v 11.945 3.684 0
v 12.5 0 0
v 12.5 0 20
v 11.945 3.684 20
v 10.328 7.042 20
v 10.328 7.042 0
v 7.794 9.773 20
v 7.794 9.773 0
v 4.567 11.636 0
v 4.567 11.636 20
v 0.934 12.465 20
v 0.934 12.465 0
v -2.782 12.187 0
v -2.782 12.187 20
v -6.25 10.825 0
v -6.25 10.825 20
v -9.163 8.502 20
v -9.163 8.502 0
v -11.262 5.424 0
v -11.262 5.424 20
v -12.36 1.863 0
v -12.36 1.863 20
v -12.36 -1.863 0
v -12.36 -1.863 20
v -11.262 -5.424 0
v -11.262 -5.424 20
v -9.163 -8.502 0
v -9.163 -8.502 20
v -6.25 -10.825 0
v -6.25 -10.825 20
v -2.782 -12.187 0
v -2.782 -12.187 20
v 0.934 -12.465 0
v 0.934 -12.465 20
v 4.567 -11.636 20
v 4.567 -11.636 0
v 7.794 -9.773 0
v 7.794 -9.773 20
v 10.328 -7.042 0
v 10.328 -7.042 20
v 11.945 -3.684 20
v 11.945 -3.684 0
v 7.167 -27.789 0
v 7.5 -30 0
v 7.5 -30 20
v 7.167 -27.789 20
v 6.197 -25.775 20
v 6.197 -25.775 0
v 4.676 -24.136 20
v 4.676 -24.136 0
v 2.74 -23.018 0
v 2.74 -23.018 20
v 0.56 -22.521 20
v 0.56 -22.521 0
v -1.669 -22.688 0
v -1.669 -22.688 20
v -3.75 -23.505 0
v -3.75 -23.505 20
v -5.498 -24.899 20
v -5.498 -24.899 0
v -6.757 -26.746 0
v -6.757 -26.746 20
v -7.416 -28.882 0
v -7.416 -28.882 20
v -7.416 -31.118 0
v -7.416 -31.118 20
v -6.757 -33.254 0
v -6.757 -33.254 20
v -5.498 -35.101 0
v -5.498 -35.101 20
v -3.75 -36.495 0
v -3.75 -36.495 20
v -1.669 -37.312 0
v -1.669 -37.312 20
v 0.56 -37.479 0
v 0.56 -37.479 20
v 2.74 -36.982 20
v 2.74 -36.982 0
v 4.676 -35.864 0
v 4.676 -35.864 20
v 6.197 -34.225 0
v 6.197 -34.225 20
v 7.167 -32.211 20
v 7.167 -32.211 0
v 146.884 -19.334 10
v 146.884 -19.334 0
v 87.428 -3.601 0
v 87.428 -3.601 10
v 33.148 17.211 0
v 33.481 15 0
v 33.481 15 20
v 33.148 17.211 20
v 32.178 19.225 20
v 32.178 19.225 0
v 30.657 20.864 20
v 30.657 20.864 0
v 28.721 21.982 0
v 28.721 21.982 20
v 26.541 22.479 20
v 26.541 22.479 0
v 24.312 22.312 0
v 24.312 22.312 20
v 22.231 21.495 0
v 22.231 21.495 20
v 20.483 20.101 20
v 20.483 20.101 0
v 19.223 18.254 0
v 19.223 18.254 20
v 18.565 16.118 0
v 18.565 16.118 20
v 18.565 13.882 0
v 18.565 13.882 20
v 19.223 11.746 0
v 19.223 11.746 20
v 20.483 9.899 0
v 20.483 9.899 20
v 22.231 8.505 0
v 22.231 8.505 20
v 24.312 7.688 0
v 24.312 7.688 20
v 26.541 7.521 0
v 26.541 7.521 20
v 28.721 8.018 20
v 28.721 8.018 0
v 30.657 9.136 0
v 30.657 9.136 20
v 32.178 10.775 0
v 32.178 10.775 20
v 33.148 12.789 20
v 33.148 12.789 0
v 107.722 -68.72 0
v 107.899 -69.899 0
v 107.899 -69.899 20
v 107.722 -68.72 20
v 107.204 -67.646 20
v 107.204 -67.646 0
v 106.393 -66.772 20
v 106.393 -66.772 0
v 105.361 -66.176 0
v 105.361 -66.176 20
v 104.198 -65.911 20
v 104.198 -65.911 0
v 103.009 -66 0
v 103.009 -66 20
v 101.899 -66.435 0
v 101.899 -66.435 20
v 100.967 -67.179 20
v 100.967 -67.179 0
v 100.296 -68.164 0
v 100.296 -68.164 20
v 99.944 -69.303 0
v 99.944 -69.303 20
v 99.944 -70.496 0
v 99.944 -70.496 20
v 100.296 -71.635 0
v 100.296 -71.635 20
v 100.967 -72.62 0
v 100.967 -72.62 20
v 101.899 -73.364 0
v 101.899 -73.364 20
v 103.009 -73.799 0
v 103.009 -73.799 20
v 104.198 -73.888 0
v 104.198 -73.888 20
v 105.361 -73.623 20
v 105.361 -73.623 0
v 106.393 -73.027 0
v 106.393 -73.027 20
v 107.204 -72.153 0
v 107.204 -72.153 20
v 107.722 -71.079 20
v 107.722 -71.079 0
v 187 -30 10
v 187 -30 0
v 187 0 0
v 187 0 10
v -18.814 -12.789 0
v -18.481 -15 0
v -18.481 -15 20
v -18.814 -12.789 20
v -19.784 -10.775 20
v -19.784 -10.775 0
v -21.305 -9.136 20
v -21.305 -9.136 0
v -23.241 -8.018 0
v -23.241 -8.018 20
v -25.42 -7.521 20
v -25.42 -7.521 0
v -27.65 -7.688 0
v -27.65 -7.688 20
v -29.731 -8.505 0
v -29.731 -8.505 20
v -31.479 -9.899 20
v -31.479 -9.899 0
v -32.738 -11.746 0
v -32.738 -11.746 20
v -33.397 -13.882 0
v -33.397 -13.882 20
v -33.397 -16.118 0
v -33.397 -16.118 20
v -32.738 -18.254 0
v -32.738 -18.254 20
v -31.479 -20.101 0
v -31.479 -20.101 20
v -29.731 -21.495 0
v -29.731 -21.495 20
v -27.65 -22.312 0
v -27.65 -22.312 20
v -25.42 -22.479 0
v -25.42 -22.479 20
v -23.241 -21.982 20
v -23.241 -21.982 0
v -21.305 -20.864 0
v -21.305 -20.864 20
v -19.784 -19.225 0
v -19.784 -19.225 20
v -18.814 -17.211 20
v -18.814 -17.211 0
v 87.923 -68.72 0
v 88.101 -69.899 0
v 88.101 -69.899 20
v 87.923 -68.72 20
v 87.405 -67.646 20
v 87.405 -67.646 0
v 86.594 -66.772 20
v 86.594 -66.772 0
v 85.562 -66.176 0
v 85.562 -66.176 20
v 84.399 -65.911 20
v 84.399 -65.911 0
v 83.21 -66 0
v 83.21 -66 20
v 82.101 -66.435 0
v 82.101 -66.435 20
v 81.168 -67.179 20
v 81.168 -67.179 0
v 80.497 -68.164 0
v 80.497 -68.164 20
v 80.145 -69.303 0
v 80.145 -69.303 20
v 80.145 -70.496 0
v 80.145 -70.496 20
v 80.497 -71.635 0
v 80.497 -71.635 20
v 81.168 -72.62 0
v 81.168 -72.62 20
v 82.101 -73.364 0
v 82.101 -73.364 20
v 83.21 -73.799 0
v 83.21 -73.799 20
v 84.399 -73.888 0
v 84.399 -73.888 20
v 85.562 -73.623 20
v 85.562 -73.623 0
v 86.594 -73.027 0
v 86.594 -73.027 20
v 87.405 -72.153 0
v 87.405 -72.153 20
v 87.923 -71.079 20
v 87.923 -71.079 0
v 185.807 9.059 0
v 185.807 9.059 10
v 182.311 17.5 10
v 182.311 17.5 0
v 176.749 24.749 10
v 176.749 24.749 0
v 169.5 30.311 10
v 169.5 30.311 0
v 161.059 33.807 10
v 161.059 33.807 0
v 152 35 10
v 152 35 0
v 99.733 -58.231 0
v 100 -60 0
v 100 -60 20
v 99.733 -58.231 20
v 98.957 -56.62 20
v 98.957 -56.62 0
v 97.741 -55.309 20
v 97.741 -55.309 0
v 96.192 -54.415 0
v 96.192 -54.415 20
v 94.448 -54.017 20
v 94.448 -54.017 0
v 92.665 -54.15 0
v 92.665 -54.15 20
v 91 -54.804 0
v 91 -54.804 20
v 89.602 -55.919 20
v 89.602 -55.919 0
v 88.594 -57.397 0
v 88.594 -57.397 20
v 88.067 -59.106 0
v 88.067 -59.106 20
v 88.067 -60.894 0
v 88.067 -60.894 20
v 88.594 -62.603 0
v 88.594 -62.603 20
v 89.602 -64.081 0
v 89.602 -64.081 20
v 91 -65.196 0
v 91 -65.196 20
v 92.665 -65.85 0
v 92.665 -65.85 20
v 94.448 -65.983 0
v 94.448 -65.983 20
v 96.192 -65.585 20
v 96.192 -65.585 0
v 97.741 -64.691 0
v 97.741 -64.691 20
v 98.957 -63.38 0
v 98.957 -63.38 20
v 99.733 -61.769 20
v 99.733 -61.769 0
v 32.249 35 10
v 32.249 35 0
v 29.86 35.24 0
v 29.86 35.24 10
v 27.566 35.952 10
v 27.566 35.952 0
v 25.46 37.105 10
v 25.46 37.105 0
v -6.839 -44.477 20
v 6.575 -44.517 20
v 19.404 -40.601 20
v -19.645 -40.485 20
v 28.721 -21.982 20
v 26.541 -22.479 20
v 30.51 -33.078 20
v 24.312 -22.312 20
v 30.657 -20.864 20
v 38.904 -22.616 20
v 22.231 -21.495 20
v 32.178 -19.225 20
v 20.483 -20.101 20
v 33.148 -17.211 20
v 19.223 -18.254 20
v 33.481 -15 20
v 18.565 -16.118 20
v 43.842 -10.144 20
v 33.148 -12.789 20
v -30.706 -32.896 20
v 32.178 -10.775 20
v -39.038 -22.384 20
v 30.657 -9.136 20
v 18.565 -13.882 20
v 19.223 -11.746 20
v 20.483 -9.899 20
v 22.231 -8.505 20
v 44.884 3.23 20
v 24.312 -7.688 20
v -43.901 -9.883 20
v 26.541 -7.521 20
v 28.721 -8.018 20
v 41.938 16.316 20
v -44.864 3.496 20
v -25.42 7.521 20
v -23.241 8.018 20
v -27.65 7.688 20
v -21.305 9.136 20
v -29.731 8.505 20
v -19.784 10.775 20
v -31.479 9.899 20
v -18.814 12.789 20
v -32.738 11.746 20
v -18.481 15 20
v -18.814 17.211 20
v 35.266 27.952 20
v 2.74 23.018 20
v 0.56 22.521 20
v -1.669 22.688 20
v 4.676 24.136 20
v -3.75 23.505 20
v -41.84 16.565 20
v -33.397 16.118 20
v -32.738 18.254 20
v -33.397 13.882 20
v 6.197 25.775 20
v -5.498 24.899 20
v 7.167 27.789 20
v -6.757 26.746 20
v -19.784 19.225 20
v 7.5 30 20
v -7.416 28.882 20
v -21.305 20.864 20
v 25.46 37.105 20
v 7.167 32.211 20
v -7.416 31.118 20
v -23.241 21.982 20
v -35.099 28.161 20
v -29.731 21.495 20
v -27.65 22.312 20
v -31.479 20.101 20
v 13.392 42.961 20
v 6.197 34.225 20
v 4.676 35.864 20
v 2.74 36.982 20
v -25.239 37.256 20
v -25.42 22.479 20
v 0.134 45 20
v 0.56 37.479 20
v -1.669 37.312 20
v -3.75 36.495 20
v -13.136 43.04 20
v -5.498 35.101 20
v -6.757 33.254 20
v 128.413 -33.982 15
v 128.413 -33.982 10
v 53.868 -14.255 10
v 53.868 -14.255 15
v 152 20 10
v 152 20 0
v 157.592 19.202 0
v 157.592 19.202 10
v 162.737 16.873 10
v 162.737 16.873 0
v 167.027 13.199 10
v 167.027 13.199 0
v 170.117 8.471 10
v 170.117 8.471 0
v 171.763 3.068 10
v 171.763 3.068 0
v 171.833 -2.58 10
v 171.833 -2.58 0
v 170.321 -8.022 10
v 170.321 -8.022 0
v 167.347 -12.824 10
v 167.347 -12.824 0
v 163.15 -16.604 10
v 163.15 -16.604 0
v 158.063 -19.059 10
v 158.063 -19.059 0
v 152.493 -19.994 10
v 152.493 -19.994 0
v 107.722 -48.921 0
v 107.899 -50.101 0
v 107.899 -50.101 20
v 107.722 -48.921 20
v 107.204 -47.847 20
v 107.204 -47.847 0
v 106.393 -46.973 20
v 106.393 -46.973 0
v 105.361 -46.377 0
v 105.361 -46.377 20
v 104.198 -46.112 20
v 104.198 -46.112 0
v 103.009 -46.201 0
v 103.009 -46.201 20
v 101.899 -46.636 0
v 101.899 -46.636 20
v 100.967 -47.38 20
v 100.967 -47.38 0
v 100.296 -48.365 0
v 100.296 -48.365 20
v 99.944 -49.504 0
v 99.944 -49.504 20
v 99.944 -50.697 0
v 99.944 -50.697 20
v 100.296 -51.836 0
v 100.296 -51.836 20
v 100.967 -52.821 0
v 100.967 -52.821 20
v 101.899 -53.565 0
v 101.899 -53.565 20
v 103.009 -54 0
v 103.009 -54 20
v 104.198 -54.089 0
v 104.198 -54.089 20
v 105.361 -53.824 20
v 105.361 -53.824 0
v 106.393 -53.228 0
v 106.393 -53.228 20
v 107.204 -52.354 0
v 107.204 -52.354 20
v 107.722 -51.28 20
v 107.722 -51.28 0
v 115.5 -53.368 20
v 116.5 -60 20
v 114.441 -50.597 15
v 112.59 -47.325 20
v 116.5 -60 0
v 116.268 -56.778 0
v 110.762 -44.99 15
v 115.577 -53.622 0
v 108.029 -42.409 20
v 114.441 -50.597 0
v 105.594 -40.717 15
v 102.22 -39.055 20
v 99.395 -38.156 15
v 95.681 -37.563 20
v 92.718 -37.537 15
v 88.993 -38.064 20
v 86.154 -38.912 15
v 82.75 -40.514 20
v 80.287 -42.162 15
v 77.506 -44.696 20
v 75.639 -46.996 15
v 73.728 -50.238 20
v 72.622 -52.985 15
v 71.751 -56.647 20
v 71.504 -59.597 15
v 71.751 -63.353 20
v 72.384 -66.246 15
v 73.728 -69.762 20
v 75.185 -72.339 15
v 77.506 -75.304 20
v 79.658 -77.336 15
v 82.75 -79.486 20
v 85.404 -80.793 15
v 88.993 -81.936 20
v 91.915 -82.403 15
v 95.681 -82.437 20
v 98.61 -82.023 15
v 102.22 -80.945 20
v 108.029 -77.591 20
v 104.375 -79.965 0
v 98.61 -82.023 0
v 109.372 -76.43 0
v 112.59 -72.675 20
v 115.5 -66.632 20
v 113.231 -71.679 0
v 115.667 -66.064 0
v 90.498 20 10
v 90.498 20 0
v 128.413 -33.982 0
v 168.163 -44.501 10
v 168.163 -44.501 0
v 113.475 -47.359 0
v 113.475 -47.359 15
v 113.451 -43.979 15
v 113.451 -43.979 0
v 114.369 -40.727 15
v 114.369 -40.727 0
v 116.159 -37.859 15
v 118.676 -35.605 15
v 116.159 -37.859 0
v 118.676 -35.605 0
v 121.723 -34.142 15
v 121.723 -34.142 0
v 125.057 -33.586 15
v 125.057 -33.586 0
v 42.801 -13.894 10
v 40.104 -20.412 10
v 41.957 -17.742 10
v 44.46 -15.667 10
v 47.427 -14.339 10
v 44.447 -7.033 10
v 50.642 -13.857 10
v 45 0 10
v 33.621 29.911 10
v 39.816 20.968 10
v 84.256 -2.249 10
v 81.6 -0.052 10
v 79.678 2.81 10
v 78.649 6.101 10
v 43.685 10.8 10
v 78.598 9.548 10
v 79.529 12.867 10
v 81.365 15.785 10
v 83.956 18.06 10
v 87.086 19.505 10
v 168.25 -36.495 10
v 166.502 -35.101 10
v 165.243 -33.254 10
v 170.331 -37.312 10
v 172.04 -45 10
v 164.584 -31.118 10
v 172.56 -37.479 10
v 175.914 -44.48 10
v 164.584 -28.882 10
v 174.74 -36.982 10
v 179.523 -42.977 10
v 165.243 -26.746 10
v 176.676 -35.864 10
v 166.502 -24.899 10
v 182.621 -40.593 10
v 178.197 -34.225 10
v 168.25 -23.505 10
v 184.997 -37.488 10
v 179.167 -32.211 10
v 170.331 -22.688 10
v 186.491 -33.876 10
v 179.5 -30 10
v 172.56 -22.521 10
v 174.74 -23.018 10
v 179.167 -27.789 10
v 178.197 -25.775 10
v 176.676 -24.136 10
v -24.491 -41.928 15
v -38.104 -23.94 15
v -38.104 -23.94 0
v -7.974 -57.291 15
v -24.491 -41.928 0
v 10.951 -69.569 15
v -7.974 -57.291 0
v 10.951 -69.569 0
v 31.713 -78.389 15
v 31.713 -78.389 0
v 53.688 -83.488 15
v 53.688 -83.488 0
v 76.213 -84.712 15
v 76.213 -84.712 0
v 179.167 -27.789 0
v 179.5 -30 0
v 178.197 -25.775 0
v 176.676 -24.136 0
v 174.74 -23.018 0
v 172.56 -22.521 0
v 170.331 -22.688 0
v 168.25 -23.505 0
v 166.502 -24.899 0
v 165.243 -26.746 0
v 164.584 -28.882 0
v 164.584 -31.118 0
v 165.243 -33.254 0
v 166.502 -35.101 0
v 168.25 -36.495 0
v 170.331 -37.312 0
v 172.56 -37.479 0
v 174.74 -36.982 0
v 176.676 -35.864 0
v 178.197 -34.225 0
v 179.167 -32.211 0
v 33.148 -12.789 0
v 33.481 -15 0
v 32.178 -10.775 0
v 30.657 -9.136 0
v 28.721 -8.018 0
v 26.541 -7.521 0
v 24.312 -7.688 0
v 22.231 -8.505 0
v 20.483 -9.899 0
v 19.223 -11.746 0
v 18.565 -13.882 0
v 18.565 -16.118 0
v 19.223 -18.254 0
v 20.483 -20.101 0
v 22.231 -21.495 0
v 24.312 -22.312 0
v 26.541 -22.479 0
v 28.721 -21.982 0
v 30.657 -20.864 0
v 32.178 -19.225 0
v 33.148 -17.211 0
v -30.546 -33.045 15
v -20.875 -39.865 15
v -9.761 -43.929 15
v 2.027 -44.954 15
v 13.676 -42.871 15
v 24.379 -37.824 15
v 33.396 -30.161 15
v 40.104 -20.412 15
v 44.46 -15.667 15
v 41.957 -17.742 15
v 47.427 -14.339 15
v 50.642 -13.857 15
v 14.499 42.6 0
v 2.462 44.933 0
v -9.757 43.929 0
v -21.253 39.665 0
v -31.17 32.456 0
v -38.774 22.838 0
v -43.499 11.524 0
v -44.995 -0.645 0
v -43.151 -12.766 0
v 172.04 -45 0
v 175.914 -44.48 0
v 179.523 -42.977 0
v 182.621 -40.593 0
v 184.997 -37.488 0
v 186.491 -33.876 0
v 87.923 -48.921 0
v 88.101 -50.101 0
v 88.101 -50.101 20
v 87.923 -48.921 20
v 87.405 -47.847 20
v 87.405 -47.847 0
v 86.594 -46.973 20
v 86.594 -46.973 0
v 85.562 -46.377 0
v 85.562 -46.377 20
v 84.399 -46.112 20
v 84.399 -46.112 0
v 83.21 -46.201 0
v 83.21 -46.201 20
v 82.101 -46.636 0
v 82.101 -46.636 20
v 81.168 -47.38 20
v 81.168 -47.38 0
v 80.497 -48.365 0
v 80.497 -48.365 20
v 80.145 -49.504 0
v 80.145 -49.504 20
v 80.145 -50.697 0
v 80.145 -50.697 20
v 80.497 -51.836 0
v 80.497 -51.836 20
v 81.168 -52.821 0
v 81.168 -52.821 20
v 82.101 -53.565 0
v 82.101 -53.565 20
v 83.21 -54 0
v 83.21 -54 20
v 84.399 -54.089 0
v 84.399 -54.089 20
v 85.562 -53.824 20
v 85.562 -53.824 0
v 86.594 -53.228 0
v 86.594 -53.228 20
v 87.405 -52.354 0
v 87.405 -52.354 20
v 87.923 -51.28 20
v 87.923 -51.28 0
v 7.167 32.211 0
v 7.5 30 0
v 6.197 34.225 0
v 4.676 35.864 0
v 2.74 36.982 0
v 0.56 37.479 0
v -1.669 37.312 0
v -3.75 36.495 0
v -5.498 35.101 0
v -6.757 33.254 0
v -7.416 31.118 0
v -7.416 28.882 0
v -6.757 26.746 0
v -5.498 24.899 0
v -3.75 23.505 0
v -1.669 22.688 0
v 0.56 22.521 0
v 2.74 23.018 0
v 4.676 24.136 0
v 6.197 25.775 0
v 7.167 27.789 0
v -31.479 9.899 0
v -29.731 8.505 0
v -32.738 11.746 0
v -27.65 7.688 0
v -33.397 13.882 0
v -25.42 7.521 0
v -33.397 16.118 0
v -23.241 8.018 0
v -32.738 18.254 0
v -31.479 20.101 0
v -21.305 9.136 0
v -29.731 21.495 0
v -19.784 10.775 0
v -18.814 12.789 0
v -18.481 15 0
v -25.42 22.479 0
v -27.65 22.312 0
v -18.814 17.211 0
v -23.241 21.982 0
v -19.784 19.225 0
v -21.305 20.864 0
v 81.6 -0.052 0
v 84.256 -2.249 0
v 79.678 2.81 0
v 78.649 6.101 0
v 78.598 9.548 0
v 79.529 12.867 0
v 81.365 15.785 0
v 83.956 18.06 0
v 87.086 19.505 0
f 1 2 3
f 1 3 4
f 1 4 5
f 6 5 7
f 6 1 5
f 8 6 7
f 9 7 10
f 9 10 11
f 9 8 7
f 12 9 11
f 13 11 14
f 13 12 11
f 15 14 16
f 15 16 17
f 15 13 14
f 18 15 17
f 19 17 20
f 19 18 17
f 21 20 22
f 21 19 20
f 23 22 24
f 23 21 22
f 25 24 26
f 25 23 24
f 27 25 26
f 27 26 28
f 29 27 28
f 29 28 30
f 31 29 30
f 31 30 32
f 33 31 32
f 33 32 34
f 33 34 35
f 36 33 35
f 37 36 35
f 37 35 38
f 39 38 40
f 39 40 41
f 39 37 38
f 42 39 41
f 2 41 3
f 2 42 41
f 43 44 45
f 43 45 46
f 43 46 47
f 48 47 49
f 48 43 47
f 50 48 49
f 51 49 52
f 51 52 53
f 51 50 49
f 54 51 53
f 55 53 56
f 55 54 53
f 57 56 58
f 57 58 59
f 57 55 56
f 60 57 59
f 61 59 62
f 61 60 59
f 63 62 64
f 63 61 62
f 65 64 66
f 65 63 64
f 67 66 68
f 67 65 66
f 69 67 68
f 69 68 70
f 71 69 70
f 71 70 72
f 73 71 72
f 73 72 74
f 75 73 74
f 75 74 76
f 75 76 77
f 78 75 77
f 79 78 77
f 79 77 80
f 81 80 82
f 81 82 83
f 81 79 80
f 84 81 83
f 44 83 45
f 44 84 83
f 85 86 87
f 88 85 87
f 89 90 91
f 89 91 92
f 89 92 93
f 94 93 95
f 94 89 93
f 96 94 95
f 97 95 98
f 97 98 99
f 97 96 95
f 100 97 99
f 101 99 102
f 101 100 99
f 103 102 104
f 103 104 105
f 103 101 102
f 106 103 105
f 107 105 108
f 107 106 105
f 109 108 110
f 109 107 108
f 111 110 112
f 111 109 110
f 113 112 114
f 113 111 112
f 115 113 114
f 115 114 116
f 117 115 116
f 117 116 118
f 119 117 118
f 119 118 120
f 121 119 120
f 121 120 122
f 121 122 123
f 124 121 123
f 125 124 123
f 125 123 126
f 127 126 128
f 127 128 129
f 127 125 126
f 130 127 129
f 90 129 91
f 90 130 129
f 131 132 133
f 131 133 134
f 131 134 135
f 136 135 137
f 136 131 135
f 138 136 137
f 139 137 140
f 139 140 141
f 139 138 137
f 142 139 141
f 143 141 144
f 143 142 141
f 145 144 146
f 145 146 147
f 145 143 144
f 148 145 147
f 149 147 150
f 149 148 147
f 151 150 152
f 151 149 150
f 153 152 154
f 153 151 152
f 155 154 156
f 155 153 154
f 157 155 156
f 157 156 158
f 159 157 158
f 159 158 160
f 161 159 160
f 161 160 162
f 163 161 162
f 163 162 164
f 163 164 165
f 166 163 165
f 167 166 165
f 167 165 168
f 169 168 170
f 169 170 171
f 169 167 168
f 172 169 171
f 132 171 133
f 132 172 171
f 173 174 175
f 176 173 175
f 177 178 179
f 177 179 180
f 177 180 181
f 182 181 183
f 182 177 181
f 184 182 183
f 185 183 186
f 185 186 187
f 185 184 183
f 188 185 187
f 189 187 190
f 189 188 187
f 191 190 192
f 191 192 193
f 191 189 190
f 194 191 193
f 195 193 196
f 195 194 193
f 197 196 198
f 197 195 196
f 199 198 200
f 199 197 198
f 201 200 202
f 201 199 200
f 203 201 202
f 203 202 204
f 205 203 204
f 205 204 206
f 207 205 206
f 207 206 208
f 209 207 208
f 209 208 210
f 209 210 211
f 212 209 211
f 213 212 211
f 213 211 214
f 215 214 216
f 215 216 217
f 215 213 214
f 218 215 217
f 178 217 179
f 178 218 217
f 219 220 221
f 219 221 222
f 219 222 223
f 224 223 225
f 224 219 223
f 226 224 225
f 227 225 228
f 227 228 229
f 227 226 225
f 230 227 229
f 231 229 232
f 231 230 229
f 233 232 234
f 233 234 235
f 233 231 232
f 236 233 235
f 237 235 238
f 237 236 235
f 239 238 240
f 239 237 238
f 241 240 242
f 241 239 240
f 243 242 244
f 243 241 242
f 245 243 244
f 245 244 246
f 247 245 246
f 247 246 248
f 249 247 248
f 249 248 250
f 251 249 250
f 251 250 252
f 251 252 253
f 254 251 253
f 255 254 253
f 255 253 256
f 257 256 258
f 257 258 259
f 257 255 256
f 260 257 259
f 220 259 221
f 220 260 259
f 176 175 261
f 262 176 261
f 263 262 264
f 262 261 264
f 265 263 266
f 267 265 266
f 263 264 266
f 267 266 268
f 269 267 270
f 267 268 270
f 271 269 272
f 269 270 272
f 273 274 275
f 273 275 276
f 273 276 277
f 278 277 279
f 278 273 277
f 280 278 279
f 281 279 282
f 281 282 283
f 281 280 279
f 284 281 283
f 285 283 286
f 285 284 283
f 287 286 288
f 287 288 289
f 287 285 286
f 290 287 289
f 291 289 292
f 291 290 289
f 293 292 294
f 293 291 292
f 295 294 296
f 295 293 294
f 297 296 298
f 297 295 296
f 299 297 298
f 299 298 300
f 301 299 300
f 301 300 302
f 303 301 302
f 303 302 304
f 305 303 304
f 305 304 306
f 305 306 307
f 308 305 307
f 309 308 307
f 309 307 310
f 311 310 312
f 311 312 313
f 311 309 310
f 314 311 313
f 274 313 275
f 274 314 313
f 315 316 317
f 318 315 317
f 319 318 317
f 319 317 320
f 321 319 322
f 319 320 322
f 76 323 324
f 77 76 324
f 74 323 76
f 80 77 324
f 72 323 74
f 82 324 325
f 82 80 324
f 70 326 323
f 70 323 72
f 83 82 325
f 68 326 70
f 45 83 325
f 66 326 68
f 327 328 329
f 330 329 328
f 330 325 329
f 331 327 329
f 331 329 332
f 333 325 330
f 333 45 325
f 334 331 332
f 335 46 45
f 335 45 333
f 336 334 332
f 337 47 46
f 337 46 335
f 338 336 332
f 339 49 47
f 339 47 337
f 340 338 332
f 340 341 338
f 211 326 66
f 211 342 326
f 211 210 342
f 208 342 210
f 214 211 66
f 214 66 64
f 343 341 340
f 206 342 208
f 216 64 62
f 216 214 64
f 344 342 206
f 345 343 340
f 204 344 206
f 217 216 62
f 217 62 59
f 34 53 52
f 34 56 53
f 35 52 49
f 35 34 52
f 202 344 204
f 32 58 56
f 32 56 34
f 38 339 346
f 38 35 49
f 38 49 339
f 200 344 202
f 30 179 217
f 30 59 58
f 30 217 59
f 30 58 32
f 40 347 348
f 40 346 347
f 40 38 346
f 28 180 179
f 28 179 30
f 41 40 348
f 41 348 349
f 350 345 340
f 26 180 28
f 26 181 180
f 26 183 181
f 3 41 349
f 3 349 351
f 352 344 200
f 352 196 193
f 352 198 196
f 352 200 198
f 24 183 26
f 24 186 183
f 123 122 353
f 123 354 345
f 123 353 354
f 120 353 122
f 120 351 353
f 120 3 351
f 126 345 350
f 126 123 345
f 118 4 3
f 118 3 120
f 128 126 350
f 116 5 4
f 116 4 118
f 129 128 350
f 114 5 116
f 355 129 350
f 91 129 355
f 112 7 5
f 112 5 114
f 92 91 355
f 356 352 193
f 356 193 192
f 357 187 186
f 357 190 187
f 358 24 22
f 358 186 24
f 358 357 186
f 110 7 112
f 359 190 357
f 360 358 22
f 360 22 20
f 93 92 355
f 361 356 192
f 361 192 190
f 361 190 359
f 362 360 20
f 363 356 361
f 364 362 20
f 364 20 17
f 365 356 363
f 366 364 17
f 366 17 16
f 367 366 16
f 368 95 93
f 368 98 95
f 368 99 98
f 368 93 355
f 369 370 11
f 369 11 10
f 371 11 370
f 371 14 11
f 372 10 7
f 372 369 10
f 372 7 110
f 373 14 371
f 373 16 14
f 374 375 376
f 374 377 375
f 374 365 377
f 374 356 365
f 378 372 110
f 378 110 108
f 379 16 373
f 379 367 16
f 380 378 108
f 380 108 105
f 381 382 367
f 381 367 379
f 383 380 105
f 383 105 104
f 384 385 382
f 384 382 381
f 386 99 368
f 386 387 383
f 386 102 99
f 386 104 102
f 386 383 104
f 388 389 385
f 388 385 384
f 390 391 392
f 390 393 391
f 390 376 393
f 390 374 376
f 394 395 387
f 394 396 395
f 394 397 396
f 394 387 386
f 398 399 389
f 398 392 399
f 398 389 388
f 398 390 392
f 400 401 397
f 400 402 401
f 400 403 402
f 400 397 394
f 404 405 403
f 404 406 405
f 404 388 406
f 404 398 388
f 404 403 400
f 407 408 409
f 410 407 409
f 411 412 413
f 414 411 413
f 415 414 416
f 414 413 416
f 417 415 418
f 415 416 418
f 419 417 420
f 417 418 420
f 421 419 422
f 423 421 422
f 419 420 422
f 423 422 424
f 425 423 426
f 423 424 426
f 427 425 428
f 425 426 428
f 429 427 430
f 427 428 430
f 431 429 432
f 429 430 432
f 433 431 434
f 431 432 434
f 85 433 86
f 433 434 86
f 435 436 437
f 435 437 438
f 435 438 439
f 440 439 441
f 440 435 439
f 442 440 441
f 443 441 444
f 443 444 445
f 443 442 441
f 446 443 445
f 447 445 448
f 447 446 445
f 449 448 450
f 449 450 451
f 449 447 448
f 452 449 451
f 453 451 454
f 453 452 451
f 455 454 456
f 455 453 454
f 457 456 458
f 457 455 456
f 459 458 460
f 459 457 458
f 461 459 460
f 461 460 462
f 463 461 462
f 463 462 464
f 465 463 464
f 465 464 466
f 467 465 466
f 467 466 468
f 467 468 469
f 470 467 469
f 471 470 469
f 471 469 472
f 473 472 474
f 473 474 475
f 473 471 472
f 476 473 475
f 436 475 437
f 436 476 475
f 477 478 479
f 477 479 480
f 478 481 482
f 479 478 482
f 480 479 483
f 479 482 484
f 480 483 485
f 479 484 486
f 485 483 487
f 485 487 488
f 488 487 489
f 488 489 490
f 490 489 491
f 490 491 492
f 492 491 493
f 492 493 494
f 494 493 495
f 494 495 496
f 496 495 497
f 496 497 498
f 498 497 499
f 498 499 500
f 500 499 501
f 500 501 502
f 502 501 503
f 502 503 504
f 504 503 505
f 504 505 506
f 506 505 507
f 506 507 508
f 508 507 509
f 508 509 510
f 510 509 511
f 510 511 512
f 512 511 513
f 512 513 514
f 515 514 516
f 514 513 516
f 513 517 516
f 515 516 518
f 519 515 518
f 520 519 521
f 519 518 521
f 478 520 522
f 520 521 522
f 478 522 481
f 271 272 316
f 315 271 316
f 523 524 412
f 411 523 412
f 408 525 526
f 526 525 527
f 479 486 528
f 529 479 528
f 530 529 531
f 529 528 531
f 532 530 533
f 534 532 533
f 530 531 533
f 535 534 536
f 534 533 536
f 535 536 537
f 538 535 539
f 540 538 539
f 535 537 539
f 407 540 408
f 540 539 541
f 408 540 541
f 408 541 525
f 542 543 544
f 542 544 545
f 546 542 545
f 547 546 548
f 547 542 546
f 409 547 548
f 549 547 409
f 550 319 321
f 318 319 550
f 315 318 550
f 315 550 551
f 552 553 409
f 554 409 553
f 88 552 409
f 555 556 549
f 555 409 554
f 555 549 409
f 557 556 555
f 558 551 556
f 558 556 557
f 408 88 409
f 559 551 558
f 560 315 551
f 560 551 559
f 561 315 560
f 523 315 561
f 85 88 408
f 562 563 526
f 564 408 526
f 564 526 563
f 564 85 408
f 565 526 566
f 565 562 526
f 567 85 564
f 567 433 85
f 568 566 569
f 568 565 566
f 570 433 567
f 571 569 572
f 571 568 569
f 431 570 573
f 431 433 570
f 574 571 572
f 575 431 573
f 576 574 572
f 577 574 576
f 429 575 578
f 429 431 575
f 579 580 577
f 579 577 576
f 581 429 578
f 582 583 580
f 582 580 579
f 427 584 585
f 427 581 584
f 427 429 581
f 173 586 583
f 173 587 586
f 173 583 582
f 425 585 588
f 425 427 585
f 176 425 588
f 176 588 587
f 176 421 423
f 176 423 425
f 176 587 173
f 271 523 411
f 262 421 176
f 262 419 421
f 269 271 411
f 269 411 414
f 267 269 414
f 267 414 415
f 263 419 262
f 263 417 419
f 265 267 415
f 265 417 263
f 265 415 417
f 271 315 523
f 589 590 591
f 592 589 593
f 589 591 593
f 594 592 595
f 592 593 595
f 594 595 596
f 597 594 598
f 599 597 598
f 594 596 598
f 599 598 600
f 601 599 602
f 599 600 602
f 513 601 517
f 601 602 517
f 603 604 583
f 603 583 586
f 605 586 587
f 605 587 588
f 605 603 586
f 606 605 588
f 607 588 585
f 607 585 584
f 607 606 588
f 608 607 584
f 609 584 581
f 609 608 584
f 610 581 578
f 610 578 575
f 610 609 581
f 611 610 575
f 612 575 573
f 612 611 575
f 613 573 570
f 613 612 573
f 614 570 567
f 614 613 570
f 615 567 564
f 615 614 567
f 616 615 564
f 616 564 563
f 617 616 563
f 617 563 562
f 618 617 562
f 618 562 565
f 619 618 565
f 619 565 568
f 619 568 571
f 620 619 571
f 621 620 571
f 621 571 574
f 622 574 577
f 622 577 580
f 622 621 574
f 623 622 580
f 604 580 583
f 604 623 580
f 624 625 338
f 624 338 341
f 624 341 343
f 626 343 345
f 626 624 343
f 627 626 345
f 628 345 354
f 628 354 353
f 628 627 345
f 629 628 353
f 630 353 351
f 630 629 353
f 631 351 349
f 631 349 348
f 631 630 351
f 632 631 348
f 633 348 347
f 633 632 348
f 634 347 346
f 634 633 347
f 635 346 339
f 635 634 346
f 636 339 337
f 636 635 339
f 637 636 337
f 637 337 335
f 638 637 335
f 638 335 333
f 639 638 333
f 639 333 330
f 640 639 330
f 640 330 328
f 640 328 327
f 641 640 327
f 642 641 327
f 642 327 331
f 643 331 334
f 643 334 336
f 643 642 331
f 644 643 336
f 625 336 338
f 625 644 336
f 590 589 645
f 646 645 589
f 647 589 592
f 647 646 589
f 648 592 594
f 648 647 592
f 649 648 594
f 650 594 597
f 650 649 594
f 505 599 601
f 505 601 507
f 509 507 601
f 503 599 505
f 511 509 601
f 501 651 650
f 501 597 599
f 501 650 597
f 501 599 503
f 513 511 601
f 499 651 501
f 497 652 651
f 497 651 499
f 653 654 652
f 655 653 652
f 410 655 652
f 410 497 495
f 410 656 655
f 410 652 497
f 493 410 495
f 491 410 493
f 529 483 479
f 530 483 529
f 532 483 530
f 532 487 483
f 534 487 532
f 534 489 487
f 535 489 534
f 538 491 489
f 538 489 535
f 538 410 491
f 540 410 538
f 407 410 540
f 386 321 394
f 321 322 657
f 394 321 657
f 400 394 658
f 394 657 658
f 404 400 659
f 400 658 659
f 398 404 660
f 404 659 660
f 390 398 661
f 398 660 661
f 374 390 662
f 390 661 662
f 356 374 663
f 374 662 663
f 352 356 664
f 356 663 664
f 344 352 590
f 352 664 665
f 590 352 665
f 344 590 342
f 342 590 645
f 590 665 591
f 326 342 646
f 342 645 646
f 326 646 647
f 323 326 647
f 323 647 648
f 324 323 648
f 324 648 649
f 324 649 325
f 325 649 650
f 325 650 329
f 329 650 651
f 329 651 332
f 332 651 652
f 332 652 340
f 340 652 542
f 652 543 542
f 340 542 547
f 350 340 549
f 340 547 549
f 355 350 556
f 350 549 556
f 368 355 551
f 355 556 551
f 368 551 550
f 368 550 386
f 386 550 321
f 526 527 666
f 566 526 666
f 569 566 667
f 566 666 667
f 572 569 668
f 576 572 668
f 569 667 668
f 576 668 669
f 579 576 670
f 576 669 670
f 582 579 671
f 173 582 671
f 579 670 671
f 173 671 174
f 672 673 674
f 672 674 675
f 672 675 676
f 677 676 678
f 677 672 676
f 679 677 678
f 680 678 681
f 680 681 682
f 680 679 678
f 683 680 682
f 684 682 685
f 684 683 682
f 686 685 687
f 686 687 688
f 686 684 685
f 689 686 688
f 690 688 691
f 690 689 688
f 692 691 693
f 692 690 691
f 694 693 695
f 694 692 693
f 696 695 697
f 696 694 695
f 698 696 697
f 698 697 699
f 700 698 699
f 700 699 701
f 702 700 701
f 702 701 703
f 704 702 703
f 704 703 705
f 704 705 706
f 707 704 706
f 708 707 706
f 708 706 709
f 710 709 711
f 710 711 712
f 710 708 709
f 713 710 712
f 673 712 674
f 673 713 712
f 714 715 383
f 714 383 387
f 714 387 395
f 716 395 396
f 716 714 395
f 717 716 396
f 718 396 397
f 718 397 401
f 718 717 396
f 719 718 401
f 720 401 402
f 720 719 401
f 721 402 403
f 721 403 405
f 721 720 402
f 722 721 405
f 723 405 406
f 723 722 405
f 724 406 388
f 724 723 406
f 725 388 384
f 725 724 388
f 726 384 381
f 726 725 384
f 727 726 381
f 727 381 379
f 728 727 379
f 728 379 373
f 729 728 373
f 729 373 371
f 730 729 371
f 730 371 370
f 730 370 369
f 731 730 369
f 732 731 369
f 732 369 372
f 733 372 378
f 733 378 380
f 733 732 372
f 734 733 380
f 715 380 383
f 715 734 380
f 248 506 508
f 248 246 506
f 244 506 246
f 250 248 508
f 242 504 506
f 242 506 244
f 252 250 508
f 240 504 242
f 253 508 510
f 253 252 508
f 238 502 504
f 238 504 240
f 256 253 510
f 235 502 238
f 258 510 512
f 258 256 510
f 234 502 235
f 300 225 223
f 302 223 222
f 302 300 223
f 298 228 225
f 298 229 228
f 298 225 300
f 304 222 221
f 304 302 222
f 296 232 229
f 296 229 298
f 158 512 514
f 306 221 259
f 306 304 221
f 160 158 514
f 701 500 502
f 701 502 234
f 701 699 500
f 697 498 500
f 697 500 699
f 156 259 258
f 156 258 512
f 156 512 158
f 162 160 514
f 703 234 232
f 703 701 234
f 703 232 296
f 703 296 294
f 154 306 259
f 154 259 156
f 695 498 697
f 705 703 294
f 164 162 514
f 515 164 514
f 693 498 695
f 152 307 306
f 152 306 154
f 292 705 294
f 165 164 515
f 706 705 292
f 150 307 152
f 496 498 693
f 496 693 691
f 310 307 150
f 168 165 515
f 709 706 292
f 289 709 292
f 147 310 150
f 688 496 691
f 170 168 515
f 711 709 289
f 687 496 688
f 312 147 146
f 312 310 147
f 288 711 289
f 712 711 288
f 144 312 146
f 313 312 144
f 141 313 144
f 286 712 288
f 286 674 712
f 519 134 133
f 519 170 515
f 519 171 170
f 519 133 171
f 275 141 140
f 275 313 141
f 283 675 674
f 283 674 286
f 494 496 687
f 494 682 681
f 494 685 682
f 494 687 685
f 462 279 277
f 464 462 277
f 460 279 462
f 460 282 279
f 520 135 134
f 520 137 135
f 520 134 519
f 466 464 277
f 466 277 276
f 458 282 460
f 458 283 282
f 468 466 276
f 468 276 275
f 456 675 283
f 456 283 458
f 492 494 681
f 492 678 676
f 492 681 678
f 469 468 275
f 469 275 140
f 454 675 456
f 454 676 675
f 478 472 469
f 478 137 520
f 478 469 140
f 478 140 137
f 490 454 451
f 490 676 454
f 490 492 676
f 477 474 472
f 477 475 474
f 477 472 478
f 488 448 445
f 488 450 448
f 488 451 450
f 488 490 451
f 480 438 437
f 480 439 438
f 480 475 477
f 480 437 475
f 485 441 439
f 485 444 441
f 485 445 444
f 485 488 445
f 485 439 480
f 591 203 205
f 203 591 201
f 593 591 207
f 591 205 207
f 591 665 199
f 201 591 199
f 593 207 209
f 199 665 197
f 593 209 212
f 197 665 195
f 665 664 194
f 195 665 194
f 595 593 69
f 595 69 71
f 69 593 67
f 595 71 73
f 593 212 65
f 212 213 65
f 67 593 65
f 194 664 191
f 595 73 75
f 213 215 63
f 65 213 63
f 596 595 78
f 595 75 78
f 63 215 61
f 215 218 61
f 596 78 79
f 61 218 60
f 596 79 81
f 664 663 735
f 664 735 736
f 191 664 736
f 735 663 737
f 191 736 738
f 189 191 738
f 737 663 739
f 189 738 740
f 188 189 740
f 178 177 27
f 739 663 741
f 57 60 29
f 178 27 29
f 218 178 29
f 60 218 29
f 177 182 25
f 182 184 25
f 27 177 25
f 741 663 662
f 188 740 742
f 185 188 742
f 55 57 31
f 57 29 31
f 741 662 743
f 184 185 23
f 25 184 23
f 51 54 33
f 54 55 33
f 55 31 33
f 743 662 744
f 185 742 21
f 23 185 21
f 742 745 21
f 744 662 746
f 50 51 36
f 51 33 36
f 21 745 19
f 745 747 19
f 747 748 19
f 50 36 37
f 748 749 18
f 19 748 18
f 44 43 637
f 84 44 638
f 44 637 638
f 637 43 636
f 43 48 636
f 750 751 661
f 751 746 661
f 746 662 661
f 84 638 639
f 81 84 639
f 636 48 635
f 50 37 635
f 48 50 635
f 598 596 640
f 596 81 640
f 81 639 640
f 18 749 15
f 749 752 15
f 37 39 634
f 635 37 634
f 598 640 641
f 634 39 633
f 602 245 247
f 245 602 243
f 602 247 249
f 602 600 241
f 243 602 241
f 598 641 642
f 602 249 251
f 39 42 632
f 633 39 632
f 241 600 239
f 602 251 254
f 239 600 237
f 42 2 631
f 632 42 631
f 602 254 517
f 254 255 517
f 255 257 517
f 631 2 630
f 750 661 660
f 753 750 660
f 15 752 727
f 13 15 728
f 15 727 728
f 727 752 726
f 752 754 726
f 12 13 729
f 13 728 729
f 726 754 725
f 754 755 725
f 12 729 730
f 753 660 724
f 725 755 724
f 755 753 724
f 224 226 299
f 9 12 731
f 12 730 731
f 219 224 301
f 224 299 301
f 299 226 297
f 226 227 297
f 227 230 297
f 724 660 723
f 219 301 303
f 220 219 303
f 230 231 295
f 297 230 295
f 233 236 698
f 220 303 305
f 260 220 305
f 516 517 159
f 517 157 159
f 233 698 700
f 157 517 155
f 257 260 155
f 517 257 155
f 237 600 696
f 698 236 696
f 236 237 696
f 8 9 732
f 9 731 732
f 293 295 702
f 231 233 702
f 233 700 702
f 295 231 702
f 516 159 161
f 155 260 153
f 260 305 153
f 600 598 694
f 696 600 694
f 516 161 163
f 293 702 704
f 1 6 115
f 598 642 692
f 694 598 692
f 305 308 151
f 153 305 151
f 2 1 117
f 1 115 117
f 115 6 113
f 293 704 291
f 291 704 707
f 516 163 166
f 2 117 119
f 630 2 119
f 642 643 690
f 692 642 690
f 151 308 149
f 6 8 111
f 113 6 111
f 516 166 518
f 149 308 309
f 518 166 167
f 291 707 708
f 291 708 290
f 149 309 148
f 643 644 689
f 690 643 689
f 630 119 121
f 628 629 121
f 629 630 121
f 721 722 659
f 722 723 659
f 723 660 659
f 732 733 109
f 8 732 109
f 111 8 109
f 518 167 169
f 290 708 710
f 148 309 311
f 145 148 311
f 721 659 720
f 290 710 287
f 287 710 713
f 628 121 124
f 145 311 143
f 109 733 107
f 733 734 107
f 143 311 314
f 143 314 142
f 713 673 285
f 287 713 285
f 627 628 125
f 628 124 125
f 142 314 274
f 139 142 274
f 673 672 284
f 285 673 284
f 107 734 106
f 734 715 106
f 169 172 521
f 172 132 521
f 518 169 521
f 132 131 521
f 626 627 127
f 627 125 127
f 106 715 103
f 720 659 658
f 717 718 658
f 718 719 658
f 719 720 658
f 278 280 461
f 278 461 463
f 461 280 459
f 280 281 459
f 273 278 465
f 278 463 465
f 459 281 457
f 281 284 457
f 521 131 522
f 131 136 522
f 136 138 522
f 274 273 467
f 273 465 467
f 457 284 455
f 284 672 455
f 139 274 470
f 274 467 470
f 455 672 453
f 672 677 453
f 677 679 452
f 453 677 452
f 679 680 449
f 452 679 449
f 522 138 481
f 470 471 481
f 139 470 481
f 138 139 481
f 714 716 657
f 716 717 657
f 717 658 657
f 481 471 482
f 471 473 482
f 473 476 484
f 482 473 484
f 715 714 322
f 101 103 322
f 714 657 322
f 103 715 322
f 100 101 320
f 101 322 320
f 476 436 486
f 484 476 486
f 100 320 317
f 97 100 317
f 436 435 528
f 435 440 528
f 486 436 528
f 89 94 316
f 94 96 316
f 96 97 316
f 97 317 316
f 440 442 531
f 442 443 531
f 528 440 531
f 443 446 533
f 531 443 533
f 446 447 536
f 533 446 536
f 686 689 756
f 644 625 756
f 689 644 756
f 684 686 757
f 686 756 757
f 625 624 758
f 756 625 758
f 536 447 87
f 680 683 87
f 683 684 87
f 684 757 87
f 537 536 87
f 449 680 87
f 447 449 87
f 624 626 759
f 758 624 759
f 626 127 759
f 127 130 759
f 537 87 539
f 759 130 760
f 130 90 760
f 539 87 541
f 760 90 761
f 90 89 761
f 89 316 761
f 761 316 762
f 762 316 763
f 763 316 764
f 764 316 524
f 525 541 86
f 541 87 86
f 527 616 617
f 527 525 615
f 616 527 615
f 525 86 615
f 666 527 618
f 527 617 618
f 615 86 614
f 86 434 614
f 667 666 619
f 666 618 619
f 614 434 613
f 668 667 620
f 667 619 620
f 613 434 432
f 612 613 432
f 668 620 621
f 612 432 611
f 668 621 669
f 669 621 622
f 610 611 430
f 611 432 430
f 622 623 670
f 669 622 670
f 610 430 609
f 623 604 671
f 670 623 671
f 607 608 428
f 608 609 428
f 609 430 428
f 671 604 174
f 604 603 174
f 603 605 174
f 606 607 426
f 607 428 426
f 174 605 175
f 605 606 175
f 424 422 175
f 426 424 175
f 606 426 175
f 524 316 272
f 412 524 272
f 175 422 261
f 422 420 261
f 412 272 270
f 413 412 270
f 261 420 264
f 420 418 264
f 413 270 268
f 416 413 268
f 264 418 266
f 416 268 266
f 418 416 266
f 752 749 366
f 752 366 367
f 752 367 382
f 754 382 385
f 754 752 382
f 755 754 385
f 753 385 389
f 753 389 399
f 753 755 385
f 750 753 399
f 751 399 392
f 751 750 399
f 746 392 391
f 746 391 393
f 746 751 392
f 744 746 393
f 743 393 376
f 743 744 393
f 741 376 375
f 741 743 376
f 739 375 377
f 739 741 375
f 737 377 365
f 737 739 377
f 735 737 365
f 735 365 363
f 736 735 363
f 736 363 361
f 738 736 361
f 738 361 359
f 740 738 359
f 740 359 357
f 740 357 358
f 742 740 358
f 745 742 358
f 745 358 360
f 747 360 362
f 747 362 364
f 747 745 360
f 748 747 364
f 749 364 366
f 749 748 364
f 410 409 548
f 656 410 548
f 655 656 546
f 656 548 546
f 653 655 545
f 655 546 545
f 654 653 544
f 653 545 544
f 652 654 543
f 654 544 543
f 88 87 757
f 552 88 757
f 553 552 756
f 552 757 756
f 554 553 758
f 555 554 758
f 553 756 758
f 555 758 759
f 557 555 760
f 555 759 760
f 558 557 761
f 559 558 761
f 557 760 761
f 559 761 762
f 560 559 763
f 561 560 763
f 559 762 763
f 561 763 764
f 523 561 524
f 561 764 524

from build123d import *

# Parameters (mm, degrees)
SKETCH_5_R      = 7.5
EXTRUDE_1_DEPTH = 10
SKETCH_5_3_R    = 45
SKETCH_5_3_R_2  = 7.5
SKETCH_5_3_R_3  = 12.5
SKETCH_5_3_R_4  = 22.5
SKETCH_5_3_R_5  = 4
SKETCH_5_3_R_6  = 6
EXTRUDE_2_DEPTH = 20
EXTRUDE_3_DEPTH = 15


with BuildPart() as part:
    # Эскиз5 → Бобышка-Вытянуть1 (new body)
    with BuildSketch(Plane.XY):
        with BuildLine():
            ThreePointArc((187, 0), (176.748737342, 24.748737342), (152, 35))
            Line((152, 35), (32.249030993, 35))
            ThreePointArc((32.249030993, 35), (28.694937727, 35.538393609), (25.45976131, 37.105263158))
            ThreePointArc((25.45976131, 37.105263158), (39.816386444, 20.967960571), (45, 0))
            ThreePointArc((45, 0), (43.758881795, -10.495725989), (40.103988265, -20.41249924))
            ThreePointArc((40.103988265, -20.41249924), (45.898229653, -14.901907218), (53.868271349, -14.255151415))
            Line((53.868271349, -14.255151415), (128.412955316, -33.981898358))
            Line((128.412955316, -33.981898358), (168.162642233, -44.500851195))
            ThreePointArc((168.162642233, -44.500851195), (181.149853373, -41.886134075), (187, -30))
            Line((187, -30), (187, 0))
        make_face()
        with Locations((172, -30)):
            Circle(SKETCH_5_R, mode=Mode.SUBTRACT)
        with BuildLine():
            Line((90.497574655, 20), (152, 20))
            ThreePointArc((152, 20), (171.832919165, -2.579790186), (146.883522978, -19.33446826))
            Line((146.883522978, -19.33446826), (87.427688442, -3.600680956))
            ThreePointArc((87.427688442, -3.600680956), (78.597823156, 9.547874112), (90.497574655, 20))
        make_face(mode=Mode.SUBTRACT)
    extrude(amount=EXTRUDE_1_DEPTH)

    # Эскиз5<3> → Бобышка-Вытянуть2 (add)
    # profile 1 of 2: a face of its own
    with BuildSketch(Plane.XY):
        Circle(SKETCH_5_3_R)
        with Locations((0, -30)):
            Circle(SKETCH_5_3_R_2, mode=Mode.SUBTRACT)
        with Locations((-25.980762114, -15)):
            Circle(SKETCH_5_3_R_2, mode=Mode.SUBTRACT)
        Circle(SKETCH_5_3_R_3, mode=Mode.SUBTRACT)
        with Locations((25.980762114, -15)):
            Circle(SKETCH_5_3_R_2, mode=Mode.SUBTRACT)
        with Locations((-25.980762114, 15)):
            Circle(SKETCH_5_3_R_2, mode=Mode.SUBTRACT)
        with Locations((0, 30)):
            Circle(SKETCH_5_3_R_2, mode=Mode.SUBTRACT)
        with Locations((25.980762114, 15)):
            Circle(SKETCH_5_3_R_2, mode=Mode.SUBTRACT)
    # profile 2 of 2: a face of its own
    with BuildSketch(Plane.XY):
        with Locations((94, -60)):
            Circle(SKETCH_5_3_R_4)
        with Locations((84.100505063, -69.899494937)):
            Circle(SKETCH_5_3_R_5, mode=Mode.SUBTRACT)
        with Locations((103.899494937, -69.899494937)):
            Circle(SKETCH_5_3_R_5, mode=Mode.SUBTRACT)
        with Locations((94, -60)):
            Circle(SKETCH_5_3_R_6, mode=Mode.SUBTRACT)
        with Locations((84.100505063, -50.100505063)):
            Circle(SKETCH_5_3_R_5, mode=Mode.SUBTRACT)
        with Locations((103.899494937, -50.100505063)):
            Circle(SKETCH_5_3_R_5, mode=Mode.SUBTRACT)
    extrude(amount=EXTRUDE_2_DEPTH)


with BuildPart() as extrude_2_piece_1:
    # of the separate pieces the step leaves, piece 1, a body of its own (extrude_2_pieces)
    add(part.part.solids().sort_by_distance((168.162642233, -44.500851195, 0))[0])



with BuildPart() as extrude_2_piece_2:
    # of the separate pieces the step leaves, piece 2, a body of its own (extrude_2_pieces)
    add(part.part.solids().sort_by_distance((116.5, -60, 0))[0])


with BuildPart() as extrude_2_piece_1_1:
    add(extrude_2_piece_1.part)

    add(extrude_2_piece_2.part)  # Бобышка-Вытянуть3 merges Бобышка-Вытянуть2 piece 2
    # Эскиз5<4> → Бобышка-Вытянуть3 (add)
    with BuildSketch(Plane.XY):
        with BuildLine():
            ThreePointArc((40.103988265, -20.41249924), (2.027406196, -44.954305957), (-38.103740681, -23.9396104))
            ThreePointArc((-38.103740681, -23.9396104), (21.140554647, -74.43017402), (98.610149033, -82.02263667))
            ThreePointArc((98.610149033, -82.02263667), (73.905745166, -49.877207764), (114.441132023, -50.597334335))
            ThreePointArc((114.441132023, -50.597334335), (116.158656581, -37.859460343), (128.412955316, -33.981898358))
            Line((128.412955316, -33.981898358), (53.868271349, -14.255151415))
            ThreePointArc((53.868271349, -14.255151415), (45.898229653, -14.901907218), (40.103988265, -20.41249924))
        make_face()
    extrude(amount=EXTRUDE_3_DEPTH)


solid = extrude_2_piece_1_1.part
